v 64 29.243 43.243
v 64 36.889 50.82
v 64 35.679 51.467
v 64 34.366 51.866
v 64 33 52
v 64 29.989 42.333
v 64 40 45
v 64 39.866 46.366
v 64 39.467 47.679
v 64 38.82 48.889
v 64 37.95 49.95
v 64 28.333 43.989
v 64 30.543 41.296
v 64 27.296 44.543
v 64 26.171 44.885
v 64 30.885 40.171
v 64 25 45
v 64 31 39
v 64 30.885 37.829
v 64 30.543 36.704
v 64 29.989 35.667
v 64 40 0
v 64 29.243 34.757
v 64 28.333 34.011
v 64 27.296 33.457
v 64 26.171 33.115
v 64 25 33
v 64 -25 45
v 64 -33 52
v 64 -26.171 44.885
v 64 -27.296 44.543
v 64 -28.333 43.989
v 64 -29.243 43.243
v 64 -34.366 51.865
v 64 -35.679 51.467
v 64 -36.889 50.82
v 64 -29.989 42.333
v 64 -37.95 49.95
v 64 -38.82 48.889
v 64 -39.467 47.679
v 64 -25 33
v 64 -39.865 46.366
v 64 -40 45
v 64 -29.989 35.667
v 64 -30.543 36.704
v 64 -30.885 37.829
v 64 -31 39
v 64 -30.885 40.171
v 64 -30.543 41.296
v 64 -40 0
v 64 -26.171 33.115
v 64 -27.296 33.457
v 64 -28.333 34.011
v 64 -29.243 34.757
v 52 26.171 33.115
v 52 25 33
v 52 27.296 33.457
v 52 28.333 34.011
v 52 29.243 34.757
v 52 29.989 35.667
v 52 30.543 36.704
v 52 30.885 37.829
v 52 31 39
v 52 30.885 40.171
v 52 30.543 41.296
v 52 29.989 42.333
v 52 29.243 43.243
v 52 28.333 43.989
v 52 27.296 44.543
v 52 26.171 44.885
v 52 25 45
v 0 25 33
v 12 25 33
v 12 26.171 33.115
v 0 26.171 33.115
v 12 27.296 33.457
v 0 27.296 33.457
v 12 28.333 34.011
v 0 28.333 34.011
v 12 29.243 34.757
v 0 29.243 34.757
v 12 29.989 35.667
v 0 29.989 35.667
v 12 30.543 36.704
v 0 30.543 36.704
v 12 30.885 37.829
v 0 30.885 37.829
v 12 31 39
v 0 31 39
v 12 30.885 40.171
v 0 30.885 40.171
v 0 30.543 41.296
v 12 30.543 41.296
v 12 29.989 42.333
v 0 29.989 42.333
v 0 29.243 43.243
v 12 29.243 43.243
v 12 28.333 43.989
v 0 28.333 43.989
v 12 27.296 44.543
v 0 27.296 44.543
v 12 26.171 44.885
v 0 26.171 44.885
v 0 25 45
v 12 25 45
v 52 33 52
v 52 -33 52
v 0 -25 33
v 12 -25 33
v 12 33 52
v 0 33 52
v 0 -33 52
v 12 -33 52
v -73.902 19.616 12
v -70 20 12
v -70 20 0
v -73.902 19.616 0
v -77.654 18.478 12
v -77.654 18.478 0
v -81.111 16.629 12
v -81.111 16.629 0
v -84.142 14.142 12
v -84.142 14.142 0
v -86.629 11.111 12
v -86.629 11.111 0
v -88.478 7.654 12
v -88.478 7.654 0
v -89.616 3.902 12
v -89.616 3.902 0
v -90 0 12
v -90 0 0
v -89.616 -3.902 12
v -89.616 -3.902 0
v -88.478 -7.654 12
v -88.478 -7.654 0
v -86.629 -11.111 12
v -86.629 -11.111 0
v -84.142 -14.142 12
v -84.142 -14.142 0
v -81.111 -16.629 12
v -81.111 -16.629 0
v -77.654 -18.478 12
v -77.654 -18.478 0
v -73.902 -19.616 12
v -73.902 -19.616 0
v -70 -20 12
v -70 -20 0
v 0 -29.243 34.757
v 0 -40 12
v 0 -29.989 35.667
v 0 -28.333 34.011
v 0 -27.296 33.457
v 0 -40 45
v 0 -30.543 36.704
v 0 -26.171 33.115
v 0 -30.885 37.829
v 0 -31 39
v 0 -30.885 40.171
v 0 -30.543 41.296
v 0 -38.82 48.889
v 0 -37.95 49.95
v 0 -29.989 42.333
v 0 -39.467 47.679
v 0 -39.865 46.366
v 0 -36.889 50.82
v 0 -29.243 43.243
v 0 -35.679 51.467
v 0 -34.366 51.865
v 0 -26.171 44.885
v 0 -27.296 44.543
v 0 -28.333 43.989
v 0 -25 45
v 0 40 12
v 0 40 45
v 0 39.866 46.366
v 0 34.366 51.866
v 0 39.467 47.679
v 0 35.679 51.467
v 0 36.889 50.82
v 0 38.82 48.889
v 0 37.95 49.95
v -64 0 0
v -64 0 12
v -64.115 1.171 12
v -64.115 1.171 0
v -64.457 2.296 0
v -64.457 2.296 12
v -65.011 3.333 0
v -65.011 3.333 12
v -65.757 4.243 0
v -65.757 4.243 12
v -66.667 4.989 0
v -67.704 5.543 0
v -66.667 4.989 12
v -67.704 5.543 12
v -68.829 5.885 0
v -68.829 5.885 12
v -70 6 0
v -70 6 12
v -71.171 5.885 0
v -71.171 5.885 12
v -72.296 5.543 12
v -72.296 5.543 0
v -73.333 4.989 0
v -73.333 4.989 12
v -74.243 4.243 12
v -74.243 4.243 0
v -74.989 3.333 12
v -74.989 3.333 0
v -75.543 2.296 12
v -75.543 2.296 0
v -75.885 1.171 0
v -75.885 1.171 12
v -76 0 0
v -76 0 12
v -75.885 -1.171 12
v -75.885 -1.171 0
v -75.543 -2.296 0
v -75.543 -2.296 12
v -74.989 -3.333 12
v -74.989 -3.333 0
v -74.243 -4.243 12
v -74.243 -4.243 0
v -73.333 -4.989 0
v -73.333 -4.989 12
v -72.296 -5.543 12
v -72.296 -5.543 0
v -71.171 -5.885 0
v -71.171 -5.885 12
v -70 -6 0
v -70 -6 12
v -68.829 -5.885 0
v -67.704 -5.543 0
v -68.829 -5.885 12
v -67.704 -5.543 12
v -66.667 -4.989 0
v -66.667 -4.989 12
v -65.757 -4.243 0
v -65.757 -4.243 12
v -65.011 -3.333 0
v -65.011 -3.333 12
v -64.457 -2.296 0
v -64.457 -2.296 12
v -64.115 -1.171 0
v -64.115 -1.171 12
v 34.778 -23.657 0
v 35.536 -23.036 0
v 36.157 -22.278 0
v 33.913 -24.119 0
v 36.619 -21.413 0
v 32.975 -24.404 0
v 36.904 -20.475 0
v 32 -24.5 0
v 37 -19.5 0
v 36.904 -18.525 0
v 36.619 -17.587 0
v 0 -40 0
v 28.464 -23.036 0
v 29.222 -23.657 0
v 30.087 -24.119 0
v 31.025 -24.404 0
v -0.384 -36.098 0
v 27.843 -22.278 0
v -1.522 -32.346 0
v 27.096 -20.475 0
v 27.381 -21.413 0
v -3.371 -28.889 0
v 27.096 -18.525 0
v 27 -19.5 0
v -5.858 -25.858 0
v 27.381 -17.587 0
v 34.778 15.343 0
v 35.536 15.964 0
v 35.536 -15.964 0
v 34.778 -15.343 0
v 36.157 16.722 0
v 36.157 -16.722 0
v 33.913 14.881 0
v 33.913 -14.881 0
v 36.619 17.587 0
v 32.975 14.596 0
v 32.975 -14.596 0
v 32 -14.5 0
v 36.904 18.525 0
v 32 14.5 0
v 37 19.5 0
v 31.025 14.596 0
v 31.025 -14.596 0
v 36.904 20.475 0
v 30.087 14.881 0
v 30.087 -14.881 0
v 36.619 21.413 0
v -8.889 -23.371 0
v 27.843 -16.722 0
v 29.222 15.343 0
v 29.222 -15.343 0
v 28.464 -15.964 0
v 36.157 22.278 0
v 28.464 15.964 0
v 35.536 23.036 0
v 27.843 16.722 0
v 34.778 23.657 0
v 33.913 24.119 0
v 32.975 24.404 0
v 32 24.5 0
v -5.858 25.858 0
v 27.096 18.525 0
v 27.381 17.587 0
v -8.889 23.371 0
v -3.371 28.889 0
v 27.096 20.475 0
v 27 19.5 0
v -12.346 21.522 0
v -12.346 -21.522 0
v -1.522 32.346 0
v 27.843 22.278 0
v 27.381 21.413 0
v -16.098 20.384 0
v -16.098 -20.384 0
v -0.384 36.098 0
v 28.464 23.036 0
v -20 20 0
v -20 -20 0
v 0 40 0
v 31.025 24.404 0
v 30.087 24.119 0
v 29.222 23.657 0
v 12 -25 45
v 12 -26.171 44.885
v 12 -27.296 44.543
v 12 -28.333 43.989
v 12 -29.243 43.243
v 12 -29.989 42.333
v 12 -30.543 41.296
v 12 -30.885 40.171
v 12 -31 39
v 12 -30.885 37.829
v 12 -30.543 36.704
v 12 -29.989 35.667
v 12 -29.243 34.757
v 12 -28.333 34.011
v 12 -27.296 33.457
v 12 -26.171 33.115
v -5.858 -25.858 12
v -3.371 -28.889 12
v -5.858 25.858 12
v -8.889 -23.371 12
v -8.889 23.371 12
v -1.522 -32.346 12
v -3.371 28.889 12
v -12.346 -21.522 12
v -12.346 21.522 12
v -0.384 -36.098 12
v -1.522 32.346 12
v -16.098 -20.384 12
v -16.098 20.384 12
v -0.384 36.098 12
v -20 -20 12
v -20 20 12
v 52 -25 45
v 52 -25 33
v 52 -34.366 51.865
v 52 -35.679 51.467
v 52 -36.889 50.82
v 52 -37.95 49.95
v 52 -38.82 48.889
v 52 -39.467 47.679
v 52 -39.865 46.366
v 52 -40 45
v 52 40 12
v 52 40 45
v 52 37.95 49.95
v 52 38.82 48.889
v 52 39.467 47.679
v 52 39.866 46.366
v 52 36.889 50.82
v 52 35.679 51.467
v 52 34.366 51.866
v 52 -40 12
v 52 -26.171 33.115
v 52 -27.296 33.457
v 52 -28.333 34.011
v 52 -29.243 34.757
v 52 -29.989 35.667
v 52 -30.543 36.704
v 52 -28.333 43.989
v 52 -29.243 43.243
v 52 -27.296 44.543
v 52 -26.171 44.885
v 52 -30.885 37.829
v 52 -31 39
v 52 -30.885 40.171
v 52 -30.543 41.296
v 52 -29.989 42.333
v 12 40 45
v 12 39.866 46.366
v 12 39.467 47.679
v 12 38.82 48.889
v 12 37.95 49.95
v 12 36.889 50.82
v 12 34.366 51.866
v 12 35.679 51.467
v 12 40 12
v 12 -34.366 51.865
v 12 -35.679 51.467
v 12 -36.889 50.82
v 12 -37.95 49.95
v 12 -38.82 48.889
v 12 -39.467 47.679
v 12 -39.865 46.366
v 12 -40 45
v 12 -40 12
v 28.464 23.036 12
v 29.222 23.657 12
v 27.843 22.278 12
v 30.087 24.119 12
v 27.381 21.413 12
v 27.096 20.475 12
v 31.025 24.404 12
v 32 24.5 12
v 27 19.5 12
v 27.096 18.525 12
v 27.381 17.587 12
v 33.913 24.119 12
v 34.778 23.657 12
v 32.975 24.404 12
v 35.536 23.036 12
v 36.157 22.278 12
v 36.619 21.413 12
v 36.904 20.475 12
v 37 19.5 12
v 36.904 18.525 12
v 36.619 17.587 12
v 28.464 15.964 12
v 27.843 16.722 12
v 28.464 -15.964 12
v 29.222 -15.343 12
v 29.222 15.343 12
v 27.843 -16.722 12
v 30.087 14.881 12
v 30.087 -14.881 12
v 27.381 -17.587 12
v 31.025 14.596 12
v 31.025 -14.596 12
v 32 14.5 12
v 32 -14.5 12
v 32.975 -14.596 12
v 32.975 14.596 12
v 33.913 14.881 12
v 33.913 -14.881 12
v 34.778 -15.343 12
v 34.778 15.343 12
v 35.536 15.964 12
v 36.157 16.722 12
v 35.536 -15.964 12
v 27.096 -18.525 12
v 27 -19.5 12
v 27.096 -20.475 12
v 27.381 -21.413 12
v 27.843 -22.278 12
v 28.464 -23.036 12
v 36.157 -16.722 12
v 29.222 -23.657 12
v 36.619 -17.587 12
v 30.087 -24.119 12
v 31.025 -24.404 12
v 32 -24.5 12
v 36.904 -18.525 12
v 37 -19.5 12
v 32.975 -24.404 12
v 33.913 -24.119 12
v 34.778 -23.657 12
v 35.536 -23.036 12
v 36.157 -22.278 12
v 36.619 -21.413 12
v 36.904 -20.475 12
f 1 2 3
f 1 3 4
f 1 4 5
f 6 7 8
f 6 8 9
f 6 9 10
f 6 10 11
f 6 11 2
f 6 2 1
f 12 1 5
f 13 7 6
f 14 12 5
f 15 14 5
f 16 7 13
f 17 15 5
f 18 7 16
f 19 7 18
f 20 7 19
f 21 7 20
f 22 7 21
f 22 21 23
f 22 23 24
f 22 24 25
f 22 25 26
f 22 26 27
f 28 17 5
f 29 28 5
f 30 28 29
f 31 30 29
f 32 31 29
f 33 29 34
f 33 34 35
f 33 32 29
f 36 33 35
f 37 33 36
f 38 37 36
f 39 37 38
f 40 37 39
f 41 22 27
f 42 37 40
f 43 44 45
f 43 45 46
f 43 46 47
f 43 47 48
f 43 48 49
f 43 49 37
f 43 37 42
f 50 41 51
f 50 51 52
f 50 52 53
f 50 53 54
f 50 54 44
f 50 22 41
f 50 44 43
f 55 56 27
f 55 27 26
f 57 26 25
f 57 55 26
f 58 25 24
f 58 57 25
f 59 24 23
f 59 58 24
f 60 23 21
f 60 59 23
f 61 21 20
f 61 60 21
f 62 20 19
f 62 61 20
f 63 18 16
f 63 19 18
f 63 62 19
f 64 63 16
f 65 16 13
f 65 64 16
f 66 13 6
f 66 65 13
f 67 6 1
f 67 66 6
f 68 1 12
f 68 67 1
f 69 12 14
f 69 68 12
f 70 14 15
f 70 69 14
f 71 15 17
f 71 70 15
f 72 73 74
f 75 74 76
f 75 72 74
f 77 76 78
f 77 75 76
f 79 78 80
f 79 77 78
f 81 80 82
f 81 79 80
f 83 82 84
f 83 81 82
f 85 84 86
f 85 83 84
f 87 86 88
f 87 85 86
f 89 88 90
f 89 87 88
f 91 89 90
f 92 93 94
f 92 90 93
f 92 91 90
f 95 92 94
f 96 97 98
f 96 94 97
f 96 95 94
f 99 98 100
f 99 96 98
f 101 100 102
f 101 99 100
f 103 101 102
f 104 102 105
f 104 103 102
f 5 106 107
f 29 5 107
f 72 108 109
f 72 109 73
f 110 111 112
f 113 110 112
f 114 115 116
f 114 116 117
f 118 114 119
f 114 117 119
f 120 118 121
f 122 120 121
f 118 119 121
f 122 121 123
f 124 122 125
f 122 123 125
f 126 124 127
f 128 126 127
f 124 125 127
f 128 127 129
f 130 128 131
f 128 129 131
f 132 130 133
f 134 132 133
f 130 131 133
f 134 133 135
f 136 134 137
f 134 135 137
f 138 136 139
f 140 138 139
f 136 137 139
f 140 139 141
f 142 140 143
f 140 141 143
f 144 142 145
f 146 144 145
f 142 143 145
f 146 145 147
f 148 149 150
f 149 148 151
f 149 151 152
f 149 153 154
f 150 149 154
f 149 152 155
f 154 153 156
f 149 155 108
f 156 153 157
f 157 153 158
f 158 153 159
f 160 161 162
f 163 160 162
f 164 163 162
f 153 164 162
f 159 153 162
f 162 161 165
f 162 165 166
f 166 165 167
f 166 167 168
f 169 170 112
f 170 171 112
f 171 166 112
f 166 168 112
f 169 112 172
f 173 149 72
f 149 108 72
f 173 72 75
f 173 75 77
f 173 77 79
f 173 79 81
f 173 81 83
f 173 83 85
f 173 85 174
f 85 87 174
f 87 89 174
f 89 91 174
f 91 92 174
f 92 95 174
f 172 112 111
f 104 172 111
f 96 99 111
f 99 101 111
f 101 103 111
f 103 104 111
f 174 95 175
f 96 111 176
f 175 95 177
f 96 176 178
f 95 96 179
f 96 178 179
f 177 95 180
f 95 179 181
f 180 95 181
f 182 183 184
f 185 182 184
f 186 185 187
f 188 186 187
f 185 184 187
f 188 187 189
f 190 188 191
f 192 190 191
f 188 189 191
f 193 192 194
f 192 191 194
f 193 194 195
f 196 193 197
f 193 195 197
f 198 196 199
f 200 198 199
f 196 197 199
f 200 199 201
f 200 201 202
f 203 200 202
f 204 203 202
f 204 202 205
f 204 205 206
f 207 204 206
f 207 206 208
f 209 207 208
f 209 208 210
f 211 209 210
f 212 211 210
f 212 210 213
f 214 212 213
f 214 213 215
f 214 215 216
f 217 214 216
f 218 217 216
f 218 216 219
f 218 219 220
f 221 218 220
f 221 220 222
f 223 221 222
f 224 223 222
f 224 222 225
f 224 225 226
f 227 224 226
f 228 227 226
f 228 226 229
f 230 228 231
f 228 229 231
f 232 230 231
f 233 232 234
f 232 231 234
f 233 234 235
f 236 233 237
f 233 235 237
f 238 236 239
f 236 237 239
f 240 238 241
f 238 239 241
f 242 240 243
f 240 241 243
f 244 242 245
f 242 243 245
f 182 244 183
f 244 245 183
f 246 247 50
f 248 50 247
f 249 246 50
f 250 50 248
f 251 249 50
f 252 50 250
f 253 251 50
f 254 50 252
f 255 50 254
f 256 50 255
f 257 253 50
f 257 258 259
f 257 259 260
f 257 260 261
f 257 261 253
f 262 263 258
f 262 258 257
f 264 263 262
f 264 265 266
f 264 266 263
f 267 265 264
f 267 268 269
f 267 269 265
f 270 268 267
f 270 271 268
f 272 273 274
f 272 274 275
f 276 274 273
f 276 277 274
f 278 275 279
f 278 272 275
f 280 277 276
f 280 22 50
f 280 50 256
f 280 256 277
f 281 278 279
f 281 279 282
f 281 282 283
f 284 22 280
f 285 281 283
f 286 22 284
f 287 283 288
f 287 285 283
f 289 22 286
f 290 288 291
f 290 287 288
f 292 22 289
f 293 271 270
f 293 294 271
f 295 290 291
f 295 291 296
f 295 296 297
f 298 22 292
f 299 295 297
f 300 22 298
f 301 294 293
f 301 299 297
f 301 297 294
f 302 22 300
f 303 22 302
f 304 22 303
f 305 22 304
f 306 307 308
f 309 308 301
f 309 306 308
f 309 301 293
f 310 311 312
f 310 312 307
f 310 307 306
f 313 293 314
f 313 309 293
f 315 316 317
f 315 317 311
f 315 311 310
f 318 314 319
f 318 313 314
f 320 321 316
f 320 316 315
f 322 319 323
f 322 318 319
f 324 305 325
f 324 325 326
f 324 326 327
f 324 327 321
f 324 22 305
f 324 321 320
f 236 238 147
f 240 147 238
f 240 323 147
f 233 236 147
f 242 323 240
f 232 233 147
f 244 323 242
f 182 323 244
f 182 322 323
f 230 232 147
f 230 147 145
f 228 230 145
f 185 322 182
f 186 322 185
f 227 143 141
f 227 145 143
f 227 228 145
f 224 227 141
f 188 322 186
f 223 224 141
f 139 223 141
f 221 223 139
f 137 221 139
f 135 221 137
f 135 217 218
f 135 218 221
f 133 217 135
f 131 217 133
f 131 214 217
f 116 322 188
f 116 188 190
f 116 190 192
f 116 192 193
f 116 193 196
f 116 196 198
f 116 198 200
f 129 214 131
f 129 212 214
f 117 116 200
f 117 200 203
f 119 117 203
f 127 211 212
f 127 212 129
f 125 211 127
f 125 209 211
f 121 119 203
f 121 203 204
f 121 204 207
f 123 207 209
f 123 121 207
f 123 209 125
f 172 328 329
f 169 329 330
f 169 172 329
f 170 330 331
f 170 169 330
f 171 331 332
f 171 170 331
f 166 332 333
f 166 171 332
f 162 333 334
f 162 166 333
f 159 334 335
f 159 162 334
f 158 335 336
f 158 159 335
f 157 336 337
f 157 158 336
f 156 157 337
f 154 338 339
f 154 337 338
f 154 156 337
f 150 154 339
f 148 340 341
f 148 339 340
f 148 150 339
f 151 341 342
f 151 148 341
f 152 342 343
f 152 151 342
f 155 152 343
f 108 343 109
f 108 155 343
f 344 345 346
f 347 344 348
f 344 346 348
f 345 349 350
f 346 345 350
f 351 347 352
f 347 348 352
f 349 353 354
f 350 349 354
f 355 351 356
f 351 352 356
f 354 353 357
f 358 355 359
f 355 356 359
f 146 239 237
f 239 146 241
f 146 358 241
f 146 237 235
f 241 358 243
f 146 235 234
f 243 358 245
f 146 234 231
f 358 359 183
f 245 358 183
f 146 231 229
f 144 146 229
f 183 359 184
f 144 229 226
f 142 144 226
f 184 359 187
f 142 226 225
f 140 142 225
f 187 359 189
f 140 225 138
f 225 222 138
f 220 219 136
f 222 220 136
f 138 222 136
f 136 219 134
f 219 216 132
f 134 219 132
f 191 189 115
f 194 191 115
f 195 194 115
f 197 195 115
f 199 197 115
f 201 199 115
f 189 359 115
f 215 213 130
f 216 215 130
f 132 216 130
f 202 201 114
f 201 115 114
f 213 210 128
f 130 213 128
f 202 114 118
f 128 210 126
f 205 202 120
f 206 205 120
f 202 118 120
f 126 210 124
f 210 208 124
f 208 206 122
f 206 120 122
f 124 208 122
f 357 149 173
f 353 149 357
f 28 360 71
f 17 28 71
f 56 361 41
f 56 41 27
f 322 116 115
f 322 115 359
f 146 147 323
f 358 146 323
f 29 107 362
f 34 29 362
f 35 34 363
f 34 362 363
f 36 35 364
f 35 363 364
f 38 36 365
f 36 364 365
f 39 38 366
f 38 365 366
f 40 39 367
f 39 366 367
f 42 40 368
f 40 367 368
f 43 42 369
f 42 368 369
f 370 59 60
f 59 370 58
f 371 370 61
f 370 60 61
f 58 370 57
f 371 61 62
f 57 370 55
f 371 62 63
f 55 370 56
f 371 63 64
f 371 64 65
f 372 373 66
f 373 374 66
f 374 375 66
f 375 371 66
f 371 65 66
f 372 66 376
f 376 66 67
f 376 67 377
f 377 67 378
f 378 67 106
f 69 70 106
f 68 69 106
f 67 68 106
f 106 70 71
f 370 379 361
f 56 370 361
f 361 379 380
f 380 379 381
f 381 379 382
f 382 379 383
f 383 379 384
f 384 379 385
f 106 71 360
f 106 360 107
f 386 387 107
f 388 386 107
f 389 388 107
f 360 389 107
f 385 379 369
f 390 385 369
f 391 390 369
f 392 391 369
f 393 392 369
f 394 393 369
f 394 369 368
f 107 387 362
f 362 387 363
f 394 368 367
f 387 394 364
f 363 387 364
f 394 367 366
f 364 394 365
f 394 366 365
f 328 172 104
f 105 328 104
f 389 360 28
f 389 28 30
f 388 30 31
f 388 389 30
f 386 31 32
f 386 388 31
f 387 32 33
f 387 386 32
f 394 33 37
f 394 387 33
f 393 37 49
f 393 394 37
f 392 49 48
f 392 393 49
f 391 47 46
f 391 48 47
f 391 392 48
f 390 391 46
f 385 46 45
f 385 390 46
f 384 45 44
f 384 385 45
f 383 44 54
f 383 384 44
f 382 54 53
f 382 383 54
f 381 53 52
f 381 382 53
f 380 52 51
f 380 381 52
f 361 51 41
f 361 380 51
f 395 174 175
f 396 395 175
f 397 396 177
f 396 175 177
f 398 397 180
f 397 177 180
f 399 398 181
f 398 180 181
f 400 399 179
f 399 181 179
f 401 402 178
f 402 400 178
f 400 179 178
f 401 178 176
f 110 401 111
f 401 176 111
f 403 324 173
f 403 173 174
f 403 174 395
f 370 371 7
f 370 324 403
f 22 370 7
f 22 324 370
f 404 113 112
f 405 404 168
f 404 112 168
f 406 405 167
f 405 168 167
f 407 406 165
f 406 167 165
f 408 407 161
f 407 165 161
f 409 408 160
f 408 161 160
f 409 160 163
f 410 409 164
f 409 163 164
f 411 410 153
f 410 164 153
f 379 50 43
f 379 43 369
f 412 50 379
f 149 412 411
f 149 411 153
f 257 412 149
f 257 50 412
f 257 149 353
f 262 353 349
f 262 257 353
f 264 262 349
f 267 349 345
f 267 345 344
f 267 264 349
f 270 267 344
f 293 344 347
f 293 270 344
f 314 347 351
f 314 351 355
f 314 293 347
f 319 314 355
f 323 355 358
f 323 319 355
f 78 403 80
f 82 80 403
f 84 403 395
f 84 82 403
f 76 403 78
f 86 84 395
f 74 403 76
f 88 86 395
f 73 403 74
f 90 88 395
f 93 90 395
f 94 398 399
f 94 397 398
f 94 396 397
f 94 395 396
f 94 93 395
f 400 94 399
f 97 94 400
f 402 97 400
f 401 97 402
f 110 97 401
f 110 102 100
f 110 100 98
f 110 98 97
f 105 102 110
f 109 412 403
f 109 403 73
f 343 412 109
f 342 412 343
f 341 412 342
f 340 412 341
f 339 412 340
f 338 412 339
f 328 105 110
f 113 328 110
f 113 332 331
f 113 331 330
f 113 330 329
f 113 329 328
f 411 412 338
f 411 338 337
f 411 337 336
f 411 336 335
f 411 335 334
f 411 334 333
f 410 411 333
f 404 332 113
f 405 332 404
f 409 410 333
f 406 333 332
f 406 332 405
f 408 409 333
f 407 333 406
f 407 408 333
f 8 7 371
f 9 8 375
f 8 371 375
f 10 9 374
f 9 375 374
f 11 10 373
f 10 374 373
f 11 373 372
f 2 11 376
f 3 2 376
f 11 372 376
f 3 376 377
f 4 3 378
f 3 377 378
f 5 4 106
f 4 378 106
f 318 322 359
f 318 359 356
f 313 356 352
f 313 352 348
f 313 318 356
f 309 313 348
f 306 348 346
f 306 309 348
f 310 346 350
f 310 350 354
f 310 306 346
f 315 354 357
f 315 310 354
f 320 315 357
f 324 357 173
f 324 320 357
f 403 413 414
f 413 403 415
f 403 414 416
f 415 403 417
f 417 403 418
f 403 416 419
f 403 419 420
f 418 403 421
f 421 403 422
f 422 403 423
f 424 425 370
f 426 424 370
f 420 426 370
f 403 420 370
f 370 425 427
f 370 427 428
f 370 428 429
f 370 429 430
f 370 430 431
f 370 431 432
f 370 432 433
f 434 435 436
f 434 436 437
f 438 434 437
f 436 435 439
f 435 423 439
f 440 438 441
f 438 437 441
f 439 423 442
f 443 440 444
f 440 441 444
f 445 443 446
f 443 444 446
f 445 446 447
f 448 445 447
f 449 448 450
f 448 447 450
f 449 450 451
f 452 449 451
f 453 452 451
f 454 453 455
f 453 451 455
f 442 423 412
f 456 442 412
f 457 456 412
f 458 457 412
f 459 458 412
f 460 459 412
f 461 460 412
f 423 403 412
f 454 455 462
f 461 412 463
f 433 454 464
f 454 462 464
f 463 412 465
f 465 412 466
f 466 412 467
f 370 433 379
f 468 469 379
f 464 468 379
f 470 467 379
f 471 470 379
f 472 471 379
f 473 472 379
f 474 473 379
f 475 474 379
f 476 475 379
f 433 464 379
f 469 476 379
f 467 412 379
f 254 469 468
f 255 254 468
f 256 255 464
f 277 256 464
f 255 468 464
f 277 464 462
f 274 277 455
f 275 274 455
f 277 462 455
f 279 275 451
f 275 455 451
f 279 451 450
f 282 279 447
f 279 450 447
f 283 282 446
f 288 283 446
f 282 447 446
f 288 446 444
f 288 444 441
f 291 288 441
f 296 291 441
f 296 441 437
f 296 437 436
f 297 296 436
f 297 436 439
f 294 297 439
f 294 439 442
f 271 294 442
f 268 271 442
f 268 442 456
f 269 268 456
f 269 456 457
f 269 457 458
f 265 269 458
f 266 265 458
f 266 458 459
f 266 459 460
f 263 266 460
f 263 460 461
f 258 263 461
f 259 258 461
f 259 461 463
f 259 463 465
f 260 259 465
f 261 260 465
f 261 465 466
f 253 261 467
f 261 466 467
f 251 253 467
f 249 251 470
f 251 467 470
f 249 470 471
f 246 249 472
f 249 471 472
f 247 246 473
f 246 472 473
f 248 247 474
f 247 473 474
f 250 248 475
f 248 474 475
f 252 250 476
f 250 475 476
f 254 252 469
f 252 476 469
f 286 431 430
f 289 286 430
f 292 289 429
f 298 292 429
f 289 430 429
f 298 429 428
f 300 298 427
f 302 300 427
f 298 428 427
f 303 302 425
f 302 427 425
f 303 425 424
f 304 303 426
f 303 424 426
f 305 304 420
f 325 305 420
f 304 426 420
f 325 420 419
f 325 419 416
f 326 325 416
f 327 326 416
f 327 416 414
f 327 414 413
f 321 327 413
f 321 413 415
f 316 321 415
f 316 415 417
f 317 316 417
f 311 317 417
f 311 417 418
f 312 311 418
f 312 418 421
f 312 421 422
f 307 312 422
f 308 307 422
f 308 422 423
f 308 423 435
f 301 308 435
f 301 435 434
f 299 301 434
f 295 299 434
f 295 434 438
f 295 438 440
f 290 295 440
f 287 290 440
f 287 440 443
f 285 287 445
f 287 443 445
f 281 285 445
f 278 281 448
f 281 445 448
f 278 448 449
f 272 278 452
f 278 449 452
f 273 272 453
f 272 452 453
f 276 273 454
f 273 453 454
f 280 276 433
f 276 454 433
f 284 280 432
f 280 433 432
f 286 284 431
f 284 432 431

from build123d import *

# Parameters (mm, degrees)
PAD_DEPTH            = 12
SKETCH001_R          = 6
POCKET_DEPTH         = 12.001
PAD001_DEPTH         = 64
SKETCH003_W          = 40
SKETCH003_H          = 40
POCKET001_DEPTH      = 40.001
POCKET001_DEPTH_BACK = -40.001
POCKET002_DEPTH      = 64.001
SKETCH005_R          = 5
POCKET003_DEPTH      = 12.001


with BuildPart() as part:
    # Sketch → Pad (new body)
    with BuildSketch(Plane.XY):
        with BuildLine():
            Line((0, 40), (64, 40))
            Line((64, 40), (64, -40))
            Line((64, -40), (0, -40))
            ThreePointArc((0, -40), (-5.857864, -25.857864), (-20, -20))
            Line((-70, -20), (-20, -20))
            ThreePointArc((-70, 20), (-90, 0), (-70, -20))
            Line((-70, 20), (-19.999939, 20))
            ThreePointArc((-19.999939, 20), (-5.857843, 25.857886), (0, 40))
        make_face()
    extrude(amount=PAD_DEPTH)

    # Sketch001 (on DatumPlane) → Pocket (cut, through all)
    with BuildSketch(Plane.XY.offset(12)):
        with Locations((-70, 0)):
            Circle(SKETCH001_R)
    extrude(amount=-POCKET_DEPTH, mode=Mode.SUBTRACT)

    # Sketch002 → Pad001 (join)
    with BuildSketch(Plane.YZ):
        with BuildLine():
            Line((-40, 0), (40, 0))
            Line((40, 0), (40, 44.999965))
            ThreePointArc((40, 44.999965), (37.949747, 49.949747), (32.999965, 52))
            Line((32.999965, 52), (-33, 52))
            ThreePointArc((-33, 52), (-37.949747, 49.949748), (-40, 45))
            Line((-40, 45), (-40, 0))
        make_face()
    extrude(amount=PAD001_DEPTH)

    # Sketch003 → Pocket001 (cut, two sides)
    with BuildSketch(Plane.XZ) as pocket001_sk:
        with Locations((32, 32)):
            Rectangle(SKETCH003_W, SKETCH003_H)
    extrude(amount=-POCKET001_DEPTH, mode=Mode.SUBTRACT)
    extrude(pocket001_sk.sketch, amount=-POCKET001_DEPTH_BACK, mode=Mode.SUBTRACT)

    # Sketch004 → Pocket002 (cut, through all)
    with BuildSketch(Plane.YZ):
        with BuildLine():
            ThreePointArc((-25, 45), (-31, 39), (-25, 33))
            Line((-25, 33), (25, 33))
            ThreePointArc((25, 33), (31, 39), (25, 45))
            Line((-25, 45), (25, 45))
        make_face()
    extrude(amount=POCKET002_DEPTH, mode=Mode.SUBTRACT)

    # Sketch005 (on DatumPlane) → Pocket003 (cut, through all)
    with BuildSketch(Plane.XY.offset(12)):
        with Locations((32, 19.5)):
            Circle(SKETCH005_R)
        with Locations((32, -19.5)):
            Circle(SKETCH005_R)
    extrude(amount=-POCKET003_DEPTH, mode=Mode.SUBTRACT)


solid = part.part
